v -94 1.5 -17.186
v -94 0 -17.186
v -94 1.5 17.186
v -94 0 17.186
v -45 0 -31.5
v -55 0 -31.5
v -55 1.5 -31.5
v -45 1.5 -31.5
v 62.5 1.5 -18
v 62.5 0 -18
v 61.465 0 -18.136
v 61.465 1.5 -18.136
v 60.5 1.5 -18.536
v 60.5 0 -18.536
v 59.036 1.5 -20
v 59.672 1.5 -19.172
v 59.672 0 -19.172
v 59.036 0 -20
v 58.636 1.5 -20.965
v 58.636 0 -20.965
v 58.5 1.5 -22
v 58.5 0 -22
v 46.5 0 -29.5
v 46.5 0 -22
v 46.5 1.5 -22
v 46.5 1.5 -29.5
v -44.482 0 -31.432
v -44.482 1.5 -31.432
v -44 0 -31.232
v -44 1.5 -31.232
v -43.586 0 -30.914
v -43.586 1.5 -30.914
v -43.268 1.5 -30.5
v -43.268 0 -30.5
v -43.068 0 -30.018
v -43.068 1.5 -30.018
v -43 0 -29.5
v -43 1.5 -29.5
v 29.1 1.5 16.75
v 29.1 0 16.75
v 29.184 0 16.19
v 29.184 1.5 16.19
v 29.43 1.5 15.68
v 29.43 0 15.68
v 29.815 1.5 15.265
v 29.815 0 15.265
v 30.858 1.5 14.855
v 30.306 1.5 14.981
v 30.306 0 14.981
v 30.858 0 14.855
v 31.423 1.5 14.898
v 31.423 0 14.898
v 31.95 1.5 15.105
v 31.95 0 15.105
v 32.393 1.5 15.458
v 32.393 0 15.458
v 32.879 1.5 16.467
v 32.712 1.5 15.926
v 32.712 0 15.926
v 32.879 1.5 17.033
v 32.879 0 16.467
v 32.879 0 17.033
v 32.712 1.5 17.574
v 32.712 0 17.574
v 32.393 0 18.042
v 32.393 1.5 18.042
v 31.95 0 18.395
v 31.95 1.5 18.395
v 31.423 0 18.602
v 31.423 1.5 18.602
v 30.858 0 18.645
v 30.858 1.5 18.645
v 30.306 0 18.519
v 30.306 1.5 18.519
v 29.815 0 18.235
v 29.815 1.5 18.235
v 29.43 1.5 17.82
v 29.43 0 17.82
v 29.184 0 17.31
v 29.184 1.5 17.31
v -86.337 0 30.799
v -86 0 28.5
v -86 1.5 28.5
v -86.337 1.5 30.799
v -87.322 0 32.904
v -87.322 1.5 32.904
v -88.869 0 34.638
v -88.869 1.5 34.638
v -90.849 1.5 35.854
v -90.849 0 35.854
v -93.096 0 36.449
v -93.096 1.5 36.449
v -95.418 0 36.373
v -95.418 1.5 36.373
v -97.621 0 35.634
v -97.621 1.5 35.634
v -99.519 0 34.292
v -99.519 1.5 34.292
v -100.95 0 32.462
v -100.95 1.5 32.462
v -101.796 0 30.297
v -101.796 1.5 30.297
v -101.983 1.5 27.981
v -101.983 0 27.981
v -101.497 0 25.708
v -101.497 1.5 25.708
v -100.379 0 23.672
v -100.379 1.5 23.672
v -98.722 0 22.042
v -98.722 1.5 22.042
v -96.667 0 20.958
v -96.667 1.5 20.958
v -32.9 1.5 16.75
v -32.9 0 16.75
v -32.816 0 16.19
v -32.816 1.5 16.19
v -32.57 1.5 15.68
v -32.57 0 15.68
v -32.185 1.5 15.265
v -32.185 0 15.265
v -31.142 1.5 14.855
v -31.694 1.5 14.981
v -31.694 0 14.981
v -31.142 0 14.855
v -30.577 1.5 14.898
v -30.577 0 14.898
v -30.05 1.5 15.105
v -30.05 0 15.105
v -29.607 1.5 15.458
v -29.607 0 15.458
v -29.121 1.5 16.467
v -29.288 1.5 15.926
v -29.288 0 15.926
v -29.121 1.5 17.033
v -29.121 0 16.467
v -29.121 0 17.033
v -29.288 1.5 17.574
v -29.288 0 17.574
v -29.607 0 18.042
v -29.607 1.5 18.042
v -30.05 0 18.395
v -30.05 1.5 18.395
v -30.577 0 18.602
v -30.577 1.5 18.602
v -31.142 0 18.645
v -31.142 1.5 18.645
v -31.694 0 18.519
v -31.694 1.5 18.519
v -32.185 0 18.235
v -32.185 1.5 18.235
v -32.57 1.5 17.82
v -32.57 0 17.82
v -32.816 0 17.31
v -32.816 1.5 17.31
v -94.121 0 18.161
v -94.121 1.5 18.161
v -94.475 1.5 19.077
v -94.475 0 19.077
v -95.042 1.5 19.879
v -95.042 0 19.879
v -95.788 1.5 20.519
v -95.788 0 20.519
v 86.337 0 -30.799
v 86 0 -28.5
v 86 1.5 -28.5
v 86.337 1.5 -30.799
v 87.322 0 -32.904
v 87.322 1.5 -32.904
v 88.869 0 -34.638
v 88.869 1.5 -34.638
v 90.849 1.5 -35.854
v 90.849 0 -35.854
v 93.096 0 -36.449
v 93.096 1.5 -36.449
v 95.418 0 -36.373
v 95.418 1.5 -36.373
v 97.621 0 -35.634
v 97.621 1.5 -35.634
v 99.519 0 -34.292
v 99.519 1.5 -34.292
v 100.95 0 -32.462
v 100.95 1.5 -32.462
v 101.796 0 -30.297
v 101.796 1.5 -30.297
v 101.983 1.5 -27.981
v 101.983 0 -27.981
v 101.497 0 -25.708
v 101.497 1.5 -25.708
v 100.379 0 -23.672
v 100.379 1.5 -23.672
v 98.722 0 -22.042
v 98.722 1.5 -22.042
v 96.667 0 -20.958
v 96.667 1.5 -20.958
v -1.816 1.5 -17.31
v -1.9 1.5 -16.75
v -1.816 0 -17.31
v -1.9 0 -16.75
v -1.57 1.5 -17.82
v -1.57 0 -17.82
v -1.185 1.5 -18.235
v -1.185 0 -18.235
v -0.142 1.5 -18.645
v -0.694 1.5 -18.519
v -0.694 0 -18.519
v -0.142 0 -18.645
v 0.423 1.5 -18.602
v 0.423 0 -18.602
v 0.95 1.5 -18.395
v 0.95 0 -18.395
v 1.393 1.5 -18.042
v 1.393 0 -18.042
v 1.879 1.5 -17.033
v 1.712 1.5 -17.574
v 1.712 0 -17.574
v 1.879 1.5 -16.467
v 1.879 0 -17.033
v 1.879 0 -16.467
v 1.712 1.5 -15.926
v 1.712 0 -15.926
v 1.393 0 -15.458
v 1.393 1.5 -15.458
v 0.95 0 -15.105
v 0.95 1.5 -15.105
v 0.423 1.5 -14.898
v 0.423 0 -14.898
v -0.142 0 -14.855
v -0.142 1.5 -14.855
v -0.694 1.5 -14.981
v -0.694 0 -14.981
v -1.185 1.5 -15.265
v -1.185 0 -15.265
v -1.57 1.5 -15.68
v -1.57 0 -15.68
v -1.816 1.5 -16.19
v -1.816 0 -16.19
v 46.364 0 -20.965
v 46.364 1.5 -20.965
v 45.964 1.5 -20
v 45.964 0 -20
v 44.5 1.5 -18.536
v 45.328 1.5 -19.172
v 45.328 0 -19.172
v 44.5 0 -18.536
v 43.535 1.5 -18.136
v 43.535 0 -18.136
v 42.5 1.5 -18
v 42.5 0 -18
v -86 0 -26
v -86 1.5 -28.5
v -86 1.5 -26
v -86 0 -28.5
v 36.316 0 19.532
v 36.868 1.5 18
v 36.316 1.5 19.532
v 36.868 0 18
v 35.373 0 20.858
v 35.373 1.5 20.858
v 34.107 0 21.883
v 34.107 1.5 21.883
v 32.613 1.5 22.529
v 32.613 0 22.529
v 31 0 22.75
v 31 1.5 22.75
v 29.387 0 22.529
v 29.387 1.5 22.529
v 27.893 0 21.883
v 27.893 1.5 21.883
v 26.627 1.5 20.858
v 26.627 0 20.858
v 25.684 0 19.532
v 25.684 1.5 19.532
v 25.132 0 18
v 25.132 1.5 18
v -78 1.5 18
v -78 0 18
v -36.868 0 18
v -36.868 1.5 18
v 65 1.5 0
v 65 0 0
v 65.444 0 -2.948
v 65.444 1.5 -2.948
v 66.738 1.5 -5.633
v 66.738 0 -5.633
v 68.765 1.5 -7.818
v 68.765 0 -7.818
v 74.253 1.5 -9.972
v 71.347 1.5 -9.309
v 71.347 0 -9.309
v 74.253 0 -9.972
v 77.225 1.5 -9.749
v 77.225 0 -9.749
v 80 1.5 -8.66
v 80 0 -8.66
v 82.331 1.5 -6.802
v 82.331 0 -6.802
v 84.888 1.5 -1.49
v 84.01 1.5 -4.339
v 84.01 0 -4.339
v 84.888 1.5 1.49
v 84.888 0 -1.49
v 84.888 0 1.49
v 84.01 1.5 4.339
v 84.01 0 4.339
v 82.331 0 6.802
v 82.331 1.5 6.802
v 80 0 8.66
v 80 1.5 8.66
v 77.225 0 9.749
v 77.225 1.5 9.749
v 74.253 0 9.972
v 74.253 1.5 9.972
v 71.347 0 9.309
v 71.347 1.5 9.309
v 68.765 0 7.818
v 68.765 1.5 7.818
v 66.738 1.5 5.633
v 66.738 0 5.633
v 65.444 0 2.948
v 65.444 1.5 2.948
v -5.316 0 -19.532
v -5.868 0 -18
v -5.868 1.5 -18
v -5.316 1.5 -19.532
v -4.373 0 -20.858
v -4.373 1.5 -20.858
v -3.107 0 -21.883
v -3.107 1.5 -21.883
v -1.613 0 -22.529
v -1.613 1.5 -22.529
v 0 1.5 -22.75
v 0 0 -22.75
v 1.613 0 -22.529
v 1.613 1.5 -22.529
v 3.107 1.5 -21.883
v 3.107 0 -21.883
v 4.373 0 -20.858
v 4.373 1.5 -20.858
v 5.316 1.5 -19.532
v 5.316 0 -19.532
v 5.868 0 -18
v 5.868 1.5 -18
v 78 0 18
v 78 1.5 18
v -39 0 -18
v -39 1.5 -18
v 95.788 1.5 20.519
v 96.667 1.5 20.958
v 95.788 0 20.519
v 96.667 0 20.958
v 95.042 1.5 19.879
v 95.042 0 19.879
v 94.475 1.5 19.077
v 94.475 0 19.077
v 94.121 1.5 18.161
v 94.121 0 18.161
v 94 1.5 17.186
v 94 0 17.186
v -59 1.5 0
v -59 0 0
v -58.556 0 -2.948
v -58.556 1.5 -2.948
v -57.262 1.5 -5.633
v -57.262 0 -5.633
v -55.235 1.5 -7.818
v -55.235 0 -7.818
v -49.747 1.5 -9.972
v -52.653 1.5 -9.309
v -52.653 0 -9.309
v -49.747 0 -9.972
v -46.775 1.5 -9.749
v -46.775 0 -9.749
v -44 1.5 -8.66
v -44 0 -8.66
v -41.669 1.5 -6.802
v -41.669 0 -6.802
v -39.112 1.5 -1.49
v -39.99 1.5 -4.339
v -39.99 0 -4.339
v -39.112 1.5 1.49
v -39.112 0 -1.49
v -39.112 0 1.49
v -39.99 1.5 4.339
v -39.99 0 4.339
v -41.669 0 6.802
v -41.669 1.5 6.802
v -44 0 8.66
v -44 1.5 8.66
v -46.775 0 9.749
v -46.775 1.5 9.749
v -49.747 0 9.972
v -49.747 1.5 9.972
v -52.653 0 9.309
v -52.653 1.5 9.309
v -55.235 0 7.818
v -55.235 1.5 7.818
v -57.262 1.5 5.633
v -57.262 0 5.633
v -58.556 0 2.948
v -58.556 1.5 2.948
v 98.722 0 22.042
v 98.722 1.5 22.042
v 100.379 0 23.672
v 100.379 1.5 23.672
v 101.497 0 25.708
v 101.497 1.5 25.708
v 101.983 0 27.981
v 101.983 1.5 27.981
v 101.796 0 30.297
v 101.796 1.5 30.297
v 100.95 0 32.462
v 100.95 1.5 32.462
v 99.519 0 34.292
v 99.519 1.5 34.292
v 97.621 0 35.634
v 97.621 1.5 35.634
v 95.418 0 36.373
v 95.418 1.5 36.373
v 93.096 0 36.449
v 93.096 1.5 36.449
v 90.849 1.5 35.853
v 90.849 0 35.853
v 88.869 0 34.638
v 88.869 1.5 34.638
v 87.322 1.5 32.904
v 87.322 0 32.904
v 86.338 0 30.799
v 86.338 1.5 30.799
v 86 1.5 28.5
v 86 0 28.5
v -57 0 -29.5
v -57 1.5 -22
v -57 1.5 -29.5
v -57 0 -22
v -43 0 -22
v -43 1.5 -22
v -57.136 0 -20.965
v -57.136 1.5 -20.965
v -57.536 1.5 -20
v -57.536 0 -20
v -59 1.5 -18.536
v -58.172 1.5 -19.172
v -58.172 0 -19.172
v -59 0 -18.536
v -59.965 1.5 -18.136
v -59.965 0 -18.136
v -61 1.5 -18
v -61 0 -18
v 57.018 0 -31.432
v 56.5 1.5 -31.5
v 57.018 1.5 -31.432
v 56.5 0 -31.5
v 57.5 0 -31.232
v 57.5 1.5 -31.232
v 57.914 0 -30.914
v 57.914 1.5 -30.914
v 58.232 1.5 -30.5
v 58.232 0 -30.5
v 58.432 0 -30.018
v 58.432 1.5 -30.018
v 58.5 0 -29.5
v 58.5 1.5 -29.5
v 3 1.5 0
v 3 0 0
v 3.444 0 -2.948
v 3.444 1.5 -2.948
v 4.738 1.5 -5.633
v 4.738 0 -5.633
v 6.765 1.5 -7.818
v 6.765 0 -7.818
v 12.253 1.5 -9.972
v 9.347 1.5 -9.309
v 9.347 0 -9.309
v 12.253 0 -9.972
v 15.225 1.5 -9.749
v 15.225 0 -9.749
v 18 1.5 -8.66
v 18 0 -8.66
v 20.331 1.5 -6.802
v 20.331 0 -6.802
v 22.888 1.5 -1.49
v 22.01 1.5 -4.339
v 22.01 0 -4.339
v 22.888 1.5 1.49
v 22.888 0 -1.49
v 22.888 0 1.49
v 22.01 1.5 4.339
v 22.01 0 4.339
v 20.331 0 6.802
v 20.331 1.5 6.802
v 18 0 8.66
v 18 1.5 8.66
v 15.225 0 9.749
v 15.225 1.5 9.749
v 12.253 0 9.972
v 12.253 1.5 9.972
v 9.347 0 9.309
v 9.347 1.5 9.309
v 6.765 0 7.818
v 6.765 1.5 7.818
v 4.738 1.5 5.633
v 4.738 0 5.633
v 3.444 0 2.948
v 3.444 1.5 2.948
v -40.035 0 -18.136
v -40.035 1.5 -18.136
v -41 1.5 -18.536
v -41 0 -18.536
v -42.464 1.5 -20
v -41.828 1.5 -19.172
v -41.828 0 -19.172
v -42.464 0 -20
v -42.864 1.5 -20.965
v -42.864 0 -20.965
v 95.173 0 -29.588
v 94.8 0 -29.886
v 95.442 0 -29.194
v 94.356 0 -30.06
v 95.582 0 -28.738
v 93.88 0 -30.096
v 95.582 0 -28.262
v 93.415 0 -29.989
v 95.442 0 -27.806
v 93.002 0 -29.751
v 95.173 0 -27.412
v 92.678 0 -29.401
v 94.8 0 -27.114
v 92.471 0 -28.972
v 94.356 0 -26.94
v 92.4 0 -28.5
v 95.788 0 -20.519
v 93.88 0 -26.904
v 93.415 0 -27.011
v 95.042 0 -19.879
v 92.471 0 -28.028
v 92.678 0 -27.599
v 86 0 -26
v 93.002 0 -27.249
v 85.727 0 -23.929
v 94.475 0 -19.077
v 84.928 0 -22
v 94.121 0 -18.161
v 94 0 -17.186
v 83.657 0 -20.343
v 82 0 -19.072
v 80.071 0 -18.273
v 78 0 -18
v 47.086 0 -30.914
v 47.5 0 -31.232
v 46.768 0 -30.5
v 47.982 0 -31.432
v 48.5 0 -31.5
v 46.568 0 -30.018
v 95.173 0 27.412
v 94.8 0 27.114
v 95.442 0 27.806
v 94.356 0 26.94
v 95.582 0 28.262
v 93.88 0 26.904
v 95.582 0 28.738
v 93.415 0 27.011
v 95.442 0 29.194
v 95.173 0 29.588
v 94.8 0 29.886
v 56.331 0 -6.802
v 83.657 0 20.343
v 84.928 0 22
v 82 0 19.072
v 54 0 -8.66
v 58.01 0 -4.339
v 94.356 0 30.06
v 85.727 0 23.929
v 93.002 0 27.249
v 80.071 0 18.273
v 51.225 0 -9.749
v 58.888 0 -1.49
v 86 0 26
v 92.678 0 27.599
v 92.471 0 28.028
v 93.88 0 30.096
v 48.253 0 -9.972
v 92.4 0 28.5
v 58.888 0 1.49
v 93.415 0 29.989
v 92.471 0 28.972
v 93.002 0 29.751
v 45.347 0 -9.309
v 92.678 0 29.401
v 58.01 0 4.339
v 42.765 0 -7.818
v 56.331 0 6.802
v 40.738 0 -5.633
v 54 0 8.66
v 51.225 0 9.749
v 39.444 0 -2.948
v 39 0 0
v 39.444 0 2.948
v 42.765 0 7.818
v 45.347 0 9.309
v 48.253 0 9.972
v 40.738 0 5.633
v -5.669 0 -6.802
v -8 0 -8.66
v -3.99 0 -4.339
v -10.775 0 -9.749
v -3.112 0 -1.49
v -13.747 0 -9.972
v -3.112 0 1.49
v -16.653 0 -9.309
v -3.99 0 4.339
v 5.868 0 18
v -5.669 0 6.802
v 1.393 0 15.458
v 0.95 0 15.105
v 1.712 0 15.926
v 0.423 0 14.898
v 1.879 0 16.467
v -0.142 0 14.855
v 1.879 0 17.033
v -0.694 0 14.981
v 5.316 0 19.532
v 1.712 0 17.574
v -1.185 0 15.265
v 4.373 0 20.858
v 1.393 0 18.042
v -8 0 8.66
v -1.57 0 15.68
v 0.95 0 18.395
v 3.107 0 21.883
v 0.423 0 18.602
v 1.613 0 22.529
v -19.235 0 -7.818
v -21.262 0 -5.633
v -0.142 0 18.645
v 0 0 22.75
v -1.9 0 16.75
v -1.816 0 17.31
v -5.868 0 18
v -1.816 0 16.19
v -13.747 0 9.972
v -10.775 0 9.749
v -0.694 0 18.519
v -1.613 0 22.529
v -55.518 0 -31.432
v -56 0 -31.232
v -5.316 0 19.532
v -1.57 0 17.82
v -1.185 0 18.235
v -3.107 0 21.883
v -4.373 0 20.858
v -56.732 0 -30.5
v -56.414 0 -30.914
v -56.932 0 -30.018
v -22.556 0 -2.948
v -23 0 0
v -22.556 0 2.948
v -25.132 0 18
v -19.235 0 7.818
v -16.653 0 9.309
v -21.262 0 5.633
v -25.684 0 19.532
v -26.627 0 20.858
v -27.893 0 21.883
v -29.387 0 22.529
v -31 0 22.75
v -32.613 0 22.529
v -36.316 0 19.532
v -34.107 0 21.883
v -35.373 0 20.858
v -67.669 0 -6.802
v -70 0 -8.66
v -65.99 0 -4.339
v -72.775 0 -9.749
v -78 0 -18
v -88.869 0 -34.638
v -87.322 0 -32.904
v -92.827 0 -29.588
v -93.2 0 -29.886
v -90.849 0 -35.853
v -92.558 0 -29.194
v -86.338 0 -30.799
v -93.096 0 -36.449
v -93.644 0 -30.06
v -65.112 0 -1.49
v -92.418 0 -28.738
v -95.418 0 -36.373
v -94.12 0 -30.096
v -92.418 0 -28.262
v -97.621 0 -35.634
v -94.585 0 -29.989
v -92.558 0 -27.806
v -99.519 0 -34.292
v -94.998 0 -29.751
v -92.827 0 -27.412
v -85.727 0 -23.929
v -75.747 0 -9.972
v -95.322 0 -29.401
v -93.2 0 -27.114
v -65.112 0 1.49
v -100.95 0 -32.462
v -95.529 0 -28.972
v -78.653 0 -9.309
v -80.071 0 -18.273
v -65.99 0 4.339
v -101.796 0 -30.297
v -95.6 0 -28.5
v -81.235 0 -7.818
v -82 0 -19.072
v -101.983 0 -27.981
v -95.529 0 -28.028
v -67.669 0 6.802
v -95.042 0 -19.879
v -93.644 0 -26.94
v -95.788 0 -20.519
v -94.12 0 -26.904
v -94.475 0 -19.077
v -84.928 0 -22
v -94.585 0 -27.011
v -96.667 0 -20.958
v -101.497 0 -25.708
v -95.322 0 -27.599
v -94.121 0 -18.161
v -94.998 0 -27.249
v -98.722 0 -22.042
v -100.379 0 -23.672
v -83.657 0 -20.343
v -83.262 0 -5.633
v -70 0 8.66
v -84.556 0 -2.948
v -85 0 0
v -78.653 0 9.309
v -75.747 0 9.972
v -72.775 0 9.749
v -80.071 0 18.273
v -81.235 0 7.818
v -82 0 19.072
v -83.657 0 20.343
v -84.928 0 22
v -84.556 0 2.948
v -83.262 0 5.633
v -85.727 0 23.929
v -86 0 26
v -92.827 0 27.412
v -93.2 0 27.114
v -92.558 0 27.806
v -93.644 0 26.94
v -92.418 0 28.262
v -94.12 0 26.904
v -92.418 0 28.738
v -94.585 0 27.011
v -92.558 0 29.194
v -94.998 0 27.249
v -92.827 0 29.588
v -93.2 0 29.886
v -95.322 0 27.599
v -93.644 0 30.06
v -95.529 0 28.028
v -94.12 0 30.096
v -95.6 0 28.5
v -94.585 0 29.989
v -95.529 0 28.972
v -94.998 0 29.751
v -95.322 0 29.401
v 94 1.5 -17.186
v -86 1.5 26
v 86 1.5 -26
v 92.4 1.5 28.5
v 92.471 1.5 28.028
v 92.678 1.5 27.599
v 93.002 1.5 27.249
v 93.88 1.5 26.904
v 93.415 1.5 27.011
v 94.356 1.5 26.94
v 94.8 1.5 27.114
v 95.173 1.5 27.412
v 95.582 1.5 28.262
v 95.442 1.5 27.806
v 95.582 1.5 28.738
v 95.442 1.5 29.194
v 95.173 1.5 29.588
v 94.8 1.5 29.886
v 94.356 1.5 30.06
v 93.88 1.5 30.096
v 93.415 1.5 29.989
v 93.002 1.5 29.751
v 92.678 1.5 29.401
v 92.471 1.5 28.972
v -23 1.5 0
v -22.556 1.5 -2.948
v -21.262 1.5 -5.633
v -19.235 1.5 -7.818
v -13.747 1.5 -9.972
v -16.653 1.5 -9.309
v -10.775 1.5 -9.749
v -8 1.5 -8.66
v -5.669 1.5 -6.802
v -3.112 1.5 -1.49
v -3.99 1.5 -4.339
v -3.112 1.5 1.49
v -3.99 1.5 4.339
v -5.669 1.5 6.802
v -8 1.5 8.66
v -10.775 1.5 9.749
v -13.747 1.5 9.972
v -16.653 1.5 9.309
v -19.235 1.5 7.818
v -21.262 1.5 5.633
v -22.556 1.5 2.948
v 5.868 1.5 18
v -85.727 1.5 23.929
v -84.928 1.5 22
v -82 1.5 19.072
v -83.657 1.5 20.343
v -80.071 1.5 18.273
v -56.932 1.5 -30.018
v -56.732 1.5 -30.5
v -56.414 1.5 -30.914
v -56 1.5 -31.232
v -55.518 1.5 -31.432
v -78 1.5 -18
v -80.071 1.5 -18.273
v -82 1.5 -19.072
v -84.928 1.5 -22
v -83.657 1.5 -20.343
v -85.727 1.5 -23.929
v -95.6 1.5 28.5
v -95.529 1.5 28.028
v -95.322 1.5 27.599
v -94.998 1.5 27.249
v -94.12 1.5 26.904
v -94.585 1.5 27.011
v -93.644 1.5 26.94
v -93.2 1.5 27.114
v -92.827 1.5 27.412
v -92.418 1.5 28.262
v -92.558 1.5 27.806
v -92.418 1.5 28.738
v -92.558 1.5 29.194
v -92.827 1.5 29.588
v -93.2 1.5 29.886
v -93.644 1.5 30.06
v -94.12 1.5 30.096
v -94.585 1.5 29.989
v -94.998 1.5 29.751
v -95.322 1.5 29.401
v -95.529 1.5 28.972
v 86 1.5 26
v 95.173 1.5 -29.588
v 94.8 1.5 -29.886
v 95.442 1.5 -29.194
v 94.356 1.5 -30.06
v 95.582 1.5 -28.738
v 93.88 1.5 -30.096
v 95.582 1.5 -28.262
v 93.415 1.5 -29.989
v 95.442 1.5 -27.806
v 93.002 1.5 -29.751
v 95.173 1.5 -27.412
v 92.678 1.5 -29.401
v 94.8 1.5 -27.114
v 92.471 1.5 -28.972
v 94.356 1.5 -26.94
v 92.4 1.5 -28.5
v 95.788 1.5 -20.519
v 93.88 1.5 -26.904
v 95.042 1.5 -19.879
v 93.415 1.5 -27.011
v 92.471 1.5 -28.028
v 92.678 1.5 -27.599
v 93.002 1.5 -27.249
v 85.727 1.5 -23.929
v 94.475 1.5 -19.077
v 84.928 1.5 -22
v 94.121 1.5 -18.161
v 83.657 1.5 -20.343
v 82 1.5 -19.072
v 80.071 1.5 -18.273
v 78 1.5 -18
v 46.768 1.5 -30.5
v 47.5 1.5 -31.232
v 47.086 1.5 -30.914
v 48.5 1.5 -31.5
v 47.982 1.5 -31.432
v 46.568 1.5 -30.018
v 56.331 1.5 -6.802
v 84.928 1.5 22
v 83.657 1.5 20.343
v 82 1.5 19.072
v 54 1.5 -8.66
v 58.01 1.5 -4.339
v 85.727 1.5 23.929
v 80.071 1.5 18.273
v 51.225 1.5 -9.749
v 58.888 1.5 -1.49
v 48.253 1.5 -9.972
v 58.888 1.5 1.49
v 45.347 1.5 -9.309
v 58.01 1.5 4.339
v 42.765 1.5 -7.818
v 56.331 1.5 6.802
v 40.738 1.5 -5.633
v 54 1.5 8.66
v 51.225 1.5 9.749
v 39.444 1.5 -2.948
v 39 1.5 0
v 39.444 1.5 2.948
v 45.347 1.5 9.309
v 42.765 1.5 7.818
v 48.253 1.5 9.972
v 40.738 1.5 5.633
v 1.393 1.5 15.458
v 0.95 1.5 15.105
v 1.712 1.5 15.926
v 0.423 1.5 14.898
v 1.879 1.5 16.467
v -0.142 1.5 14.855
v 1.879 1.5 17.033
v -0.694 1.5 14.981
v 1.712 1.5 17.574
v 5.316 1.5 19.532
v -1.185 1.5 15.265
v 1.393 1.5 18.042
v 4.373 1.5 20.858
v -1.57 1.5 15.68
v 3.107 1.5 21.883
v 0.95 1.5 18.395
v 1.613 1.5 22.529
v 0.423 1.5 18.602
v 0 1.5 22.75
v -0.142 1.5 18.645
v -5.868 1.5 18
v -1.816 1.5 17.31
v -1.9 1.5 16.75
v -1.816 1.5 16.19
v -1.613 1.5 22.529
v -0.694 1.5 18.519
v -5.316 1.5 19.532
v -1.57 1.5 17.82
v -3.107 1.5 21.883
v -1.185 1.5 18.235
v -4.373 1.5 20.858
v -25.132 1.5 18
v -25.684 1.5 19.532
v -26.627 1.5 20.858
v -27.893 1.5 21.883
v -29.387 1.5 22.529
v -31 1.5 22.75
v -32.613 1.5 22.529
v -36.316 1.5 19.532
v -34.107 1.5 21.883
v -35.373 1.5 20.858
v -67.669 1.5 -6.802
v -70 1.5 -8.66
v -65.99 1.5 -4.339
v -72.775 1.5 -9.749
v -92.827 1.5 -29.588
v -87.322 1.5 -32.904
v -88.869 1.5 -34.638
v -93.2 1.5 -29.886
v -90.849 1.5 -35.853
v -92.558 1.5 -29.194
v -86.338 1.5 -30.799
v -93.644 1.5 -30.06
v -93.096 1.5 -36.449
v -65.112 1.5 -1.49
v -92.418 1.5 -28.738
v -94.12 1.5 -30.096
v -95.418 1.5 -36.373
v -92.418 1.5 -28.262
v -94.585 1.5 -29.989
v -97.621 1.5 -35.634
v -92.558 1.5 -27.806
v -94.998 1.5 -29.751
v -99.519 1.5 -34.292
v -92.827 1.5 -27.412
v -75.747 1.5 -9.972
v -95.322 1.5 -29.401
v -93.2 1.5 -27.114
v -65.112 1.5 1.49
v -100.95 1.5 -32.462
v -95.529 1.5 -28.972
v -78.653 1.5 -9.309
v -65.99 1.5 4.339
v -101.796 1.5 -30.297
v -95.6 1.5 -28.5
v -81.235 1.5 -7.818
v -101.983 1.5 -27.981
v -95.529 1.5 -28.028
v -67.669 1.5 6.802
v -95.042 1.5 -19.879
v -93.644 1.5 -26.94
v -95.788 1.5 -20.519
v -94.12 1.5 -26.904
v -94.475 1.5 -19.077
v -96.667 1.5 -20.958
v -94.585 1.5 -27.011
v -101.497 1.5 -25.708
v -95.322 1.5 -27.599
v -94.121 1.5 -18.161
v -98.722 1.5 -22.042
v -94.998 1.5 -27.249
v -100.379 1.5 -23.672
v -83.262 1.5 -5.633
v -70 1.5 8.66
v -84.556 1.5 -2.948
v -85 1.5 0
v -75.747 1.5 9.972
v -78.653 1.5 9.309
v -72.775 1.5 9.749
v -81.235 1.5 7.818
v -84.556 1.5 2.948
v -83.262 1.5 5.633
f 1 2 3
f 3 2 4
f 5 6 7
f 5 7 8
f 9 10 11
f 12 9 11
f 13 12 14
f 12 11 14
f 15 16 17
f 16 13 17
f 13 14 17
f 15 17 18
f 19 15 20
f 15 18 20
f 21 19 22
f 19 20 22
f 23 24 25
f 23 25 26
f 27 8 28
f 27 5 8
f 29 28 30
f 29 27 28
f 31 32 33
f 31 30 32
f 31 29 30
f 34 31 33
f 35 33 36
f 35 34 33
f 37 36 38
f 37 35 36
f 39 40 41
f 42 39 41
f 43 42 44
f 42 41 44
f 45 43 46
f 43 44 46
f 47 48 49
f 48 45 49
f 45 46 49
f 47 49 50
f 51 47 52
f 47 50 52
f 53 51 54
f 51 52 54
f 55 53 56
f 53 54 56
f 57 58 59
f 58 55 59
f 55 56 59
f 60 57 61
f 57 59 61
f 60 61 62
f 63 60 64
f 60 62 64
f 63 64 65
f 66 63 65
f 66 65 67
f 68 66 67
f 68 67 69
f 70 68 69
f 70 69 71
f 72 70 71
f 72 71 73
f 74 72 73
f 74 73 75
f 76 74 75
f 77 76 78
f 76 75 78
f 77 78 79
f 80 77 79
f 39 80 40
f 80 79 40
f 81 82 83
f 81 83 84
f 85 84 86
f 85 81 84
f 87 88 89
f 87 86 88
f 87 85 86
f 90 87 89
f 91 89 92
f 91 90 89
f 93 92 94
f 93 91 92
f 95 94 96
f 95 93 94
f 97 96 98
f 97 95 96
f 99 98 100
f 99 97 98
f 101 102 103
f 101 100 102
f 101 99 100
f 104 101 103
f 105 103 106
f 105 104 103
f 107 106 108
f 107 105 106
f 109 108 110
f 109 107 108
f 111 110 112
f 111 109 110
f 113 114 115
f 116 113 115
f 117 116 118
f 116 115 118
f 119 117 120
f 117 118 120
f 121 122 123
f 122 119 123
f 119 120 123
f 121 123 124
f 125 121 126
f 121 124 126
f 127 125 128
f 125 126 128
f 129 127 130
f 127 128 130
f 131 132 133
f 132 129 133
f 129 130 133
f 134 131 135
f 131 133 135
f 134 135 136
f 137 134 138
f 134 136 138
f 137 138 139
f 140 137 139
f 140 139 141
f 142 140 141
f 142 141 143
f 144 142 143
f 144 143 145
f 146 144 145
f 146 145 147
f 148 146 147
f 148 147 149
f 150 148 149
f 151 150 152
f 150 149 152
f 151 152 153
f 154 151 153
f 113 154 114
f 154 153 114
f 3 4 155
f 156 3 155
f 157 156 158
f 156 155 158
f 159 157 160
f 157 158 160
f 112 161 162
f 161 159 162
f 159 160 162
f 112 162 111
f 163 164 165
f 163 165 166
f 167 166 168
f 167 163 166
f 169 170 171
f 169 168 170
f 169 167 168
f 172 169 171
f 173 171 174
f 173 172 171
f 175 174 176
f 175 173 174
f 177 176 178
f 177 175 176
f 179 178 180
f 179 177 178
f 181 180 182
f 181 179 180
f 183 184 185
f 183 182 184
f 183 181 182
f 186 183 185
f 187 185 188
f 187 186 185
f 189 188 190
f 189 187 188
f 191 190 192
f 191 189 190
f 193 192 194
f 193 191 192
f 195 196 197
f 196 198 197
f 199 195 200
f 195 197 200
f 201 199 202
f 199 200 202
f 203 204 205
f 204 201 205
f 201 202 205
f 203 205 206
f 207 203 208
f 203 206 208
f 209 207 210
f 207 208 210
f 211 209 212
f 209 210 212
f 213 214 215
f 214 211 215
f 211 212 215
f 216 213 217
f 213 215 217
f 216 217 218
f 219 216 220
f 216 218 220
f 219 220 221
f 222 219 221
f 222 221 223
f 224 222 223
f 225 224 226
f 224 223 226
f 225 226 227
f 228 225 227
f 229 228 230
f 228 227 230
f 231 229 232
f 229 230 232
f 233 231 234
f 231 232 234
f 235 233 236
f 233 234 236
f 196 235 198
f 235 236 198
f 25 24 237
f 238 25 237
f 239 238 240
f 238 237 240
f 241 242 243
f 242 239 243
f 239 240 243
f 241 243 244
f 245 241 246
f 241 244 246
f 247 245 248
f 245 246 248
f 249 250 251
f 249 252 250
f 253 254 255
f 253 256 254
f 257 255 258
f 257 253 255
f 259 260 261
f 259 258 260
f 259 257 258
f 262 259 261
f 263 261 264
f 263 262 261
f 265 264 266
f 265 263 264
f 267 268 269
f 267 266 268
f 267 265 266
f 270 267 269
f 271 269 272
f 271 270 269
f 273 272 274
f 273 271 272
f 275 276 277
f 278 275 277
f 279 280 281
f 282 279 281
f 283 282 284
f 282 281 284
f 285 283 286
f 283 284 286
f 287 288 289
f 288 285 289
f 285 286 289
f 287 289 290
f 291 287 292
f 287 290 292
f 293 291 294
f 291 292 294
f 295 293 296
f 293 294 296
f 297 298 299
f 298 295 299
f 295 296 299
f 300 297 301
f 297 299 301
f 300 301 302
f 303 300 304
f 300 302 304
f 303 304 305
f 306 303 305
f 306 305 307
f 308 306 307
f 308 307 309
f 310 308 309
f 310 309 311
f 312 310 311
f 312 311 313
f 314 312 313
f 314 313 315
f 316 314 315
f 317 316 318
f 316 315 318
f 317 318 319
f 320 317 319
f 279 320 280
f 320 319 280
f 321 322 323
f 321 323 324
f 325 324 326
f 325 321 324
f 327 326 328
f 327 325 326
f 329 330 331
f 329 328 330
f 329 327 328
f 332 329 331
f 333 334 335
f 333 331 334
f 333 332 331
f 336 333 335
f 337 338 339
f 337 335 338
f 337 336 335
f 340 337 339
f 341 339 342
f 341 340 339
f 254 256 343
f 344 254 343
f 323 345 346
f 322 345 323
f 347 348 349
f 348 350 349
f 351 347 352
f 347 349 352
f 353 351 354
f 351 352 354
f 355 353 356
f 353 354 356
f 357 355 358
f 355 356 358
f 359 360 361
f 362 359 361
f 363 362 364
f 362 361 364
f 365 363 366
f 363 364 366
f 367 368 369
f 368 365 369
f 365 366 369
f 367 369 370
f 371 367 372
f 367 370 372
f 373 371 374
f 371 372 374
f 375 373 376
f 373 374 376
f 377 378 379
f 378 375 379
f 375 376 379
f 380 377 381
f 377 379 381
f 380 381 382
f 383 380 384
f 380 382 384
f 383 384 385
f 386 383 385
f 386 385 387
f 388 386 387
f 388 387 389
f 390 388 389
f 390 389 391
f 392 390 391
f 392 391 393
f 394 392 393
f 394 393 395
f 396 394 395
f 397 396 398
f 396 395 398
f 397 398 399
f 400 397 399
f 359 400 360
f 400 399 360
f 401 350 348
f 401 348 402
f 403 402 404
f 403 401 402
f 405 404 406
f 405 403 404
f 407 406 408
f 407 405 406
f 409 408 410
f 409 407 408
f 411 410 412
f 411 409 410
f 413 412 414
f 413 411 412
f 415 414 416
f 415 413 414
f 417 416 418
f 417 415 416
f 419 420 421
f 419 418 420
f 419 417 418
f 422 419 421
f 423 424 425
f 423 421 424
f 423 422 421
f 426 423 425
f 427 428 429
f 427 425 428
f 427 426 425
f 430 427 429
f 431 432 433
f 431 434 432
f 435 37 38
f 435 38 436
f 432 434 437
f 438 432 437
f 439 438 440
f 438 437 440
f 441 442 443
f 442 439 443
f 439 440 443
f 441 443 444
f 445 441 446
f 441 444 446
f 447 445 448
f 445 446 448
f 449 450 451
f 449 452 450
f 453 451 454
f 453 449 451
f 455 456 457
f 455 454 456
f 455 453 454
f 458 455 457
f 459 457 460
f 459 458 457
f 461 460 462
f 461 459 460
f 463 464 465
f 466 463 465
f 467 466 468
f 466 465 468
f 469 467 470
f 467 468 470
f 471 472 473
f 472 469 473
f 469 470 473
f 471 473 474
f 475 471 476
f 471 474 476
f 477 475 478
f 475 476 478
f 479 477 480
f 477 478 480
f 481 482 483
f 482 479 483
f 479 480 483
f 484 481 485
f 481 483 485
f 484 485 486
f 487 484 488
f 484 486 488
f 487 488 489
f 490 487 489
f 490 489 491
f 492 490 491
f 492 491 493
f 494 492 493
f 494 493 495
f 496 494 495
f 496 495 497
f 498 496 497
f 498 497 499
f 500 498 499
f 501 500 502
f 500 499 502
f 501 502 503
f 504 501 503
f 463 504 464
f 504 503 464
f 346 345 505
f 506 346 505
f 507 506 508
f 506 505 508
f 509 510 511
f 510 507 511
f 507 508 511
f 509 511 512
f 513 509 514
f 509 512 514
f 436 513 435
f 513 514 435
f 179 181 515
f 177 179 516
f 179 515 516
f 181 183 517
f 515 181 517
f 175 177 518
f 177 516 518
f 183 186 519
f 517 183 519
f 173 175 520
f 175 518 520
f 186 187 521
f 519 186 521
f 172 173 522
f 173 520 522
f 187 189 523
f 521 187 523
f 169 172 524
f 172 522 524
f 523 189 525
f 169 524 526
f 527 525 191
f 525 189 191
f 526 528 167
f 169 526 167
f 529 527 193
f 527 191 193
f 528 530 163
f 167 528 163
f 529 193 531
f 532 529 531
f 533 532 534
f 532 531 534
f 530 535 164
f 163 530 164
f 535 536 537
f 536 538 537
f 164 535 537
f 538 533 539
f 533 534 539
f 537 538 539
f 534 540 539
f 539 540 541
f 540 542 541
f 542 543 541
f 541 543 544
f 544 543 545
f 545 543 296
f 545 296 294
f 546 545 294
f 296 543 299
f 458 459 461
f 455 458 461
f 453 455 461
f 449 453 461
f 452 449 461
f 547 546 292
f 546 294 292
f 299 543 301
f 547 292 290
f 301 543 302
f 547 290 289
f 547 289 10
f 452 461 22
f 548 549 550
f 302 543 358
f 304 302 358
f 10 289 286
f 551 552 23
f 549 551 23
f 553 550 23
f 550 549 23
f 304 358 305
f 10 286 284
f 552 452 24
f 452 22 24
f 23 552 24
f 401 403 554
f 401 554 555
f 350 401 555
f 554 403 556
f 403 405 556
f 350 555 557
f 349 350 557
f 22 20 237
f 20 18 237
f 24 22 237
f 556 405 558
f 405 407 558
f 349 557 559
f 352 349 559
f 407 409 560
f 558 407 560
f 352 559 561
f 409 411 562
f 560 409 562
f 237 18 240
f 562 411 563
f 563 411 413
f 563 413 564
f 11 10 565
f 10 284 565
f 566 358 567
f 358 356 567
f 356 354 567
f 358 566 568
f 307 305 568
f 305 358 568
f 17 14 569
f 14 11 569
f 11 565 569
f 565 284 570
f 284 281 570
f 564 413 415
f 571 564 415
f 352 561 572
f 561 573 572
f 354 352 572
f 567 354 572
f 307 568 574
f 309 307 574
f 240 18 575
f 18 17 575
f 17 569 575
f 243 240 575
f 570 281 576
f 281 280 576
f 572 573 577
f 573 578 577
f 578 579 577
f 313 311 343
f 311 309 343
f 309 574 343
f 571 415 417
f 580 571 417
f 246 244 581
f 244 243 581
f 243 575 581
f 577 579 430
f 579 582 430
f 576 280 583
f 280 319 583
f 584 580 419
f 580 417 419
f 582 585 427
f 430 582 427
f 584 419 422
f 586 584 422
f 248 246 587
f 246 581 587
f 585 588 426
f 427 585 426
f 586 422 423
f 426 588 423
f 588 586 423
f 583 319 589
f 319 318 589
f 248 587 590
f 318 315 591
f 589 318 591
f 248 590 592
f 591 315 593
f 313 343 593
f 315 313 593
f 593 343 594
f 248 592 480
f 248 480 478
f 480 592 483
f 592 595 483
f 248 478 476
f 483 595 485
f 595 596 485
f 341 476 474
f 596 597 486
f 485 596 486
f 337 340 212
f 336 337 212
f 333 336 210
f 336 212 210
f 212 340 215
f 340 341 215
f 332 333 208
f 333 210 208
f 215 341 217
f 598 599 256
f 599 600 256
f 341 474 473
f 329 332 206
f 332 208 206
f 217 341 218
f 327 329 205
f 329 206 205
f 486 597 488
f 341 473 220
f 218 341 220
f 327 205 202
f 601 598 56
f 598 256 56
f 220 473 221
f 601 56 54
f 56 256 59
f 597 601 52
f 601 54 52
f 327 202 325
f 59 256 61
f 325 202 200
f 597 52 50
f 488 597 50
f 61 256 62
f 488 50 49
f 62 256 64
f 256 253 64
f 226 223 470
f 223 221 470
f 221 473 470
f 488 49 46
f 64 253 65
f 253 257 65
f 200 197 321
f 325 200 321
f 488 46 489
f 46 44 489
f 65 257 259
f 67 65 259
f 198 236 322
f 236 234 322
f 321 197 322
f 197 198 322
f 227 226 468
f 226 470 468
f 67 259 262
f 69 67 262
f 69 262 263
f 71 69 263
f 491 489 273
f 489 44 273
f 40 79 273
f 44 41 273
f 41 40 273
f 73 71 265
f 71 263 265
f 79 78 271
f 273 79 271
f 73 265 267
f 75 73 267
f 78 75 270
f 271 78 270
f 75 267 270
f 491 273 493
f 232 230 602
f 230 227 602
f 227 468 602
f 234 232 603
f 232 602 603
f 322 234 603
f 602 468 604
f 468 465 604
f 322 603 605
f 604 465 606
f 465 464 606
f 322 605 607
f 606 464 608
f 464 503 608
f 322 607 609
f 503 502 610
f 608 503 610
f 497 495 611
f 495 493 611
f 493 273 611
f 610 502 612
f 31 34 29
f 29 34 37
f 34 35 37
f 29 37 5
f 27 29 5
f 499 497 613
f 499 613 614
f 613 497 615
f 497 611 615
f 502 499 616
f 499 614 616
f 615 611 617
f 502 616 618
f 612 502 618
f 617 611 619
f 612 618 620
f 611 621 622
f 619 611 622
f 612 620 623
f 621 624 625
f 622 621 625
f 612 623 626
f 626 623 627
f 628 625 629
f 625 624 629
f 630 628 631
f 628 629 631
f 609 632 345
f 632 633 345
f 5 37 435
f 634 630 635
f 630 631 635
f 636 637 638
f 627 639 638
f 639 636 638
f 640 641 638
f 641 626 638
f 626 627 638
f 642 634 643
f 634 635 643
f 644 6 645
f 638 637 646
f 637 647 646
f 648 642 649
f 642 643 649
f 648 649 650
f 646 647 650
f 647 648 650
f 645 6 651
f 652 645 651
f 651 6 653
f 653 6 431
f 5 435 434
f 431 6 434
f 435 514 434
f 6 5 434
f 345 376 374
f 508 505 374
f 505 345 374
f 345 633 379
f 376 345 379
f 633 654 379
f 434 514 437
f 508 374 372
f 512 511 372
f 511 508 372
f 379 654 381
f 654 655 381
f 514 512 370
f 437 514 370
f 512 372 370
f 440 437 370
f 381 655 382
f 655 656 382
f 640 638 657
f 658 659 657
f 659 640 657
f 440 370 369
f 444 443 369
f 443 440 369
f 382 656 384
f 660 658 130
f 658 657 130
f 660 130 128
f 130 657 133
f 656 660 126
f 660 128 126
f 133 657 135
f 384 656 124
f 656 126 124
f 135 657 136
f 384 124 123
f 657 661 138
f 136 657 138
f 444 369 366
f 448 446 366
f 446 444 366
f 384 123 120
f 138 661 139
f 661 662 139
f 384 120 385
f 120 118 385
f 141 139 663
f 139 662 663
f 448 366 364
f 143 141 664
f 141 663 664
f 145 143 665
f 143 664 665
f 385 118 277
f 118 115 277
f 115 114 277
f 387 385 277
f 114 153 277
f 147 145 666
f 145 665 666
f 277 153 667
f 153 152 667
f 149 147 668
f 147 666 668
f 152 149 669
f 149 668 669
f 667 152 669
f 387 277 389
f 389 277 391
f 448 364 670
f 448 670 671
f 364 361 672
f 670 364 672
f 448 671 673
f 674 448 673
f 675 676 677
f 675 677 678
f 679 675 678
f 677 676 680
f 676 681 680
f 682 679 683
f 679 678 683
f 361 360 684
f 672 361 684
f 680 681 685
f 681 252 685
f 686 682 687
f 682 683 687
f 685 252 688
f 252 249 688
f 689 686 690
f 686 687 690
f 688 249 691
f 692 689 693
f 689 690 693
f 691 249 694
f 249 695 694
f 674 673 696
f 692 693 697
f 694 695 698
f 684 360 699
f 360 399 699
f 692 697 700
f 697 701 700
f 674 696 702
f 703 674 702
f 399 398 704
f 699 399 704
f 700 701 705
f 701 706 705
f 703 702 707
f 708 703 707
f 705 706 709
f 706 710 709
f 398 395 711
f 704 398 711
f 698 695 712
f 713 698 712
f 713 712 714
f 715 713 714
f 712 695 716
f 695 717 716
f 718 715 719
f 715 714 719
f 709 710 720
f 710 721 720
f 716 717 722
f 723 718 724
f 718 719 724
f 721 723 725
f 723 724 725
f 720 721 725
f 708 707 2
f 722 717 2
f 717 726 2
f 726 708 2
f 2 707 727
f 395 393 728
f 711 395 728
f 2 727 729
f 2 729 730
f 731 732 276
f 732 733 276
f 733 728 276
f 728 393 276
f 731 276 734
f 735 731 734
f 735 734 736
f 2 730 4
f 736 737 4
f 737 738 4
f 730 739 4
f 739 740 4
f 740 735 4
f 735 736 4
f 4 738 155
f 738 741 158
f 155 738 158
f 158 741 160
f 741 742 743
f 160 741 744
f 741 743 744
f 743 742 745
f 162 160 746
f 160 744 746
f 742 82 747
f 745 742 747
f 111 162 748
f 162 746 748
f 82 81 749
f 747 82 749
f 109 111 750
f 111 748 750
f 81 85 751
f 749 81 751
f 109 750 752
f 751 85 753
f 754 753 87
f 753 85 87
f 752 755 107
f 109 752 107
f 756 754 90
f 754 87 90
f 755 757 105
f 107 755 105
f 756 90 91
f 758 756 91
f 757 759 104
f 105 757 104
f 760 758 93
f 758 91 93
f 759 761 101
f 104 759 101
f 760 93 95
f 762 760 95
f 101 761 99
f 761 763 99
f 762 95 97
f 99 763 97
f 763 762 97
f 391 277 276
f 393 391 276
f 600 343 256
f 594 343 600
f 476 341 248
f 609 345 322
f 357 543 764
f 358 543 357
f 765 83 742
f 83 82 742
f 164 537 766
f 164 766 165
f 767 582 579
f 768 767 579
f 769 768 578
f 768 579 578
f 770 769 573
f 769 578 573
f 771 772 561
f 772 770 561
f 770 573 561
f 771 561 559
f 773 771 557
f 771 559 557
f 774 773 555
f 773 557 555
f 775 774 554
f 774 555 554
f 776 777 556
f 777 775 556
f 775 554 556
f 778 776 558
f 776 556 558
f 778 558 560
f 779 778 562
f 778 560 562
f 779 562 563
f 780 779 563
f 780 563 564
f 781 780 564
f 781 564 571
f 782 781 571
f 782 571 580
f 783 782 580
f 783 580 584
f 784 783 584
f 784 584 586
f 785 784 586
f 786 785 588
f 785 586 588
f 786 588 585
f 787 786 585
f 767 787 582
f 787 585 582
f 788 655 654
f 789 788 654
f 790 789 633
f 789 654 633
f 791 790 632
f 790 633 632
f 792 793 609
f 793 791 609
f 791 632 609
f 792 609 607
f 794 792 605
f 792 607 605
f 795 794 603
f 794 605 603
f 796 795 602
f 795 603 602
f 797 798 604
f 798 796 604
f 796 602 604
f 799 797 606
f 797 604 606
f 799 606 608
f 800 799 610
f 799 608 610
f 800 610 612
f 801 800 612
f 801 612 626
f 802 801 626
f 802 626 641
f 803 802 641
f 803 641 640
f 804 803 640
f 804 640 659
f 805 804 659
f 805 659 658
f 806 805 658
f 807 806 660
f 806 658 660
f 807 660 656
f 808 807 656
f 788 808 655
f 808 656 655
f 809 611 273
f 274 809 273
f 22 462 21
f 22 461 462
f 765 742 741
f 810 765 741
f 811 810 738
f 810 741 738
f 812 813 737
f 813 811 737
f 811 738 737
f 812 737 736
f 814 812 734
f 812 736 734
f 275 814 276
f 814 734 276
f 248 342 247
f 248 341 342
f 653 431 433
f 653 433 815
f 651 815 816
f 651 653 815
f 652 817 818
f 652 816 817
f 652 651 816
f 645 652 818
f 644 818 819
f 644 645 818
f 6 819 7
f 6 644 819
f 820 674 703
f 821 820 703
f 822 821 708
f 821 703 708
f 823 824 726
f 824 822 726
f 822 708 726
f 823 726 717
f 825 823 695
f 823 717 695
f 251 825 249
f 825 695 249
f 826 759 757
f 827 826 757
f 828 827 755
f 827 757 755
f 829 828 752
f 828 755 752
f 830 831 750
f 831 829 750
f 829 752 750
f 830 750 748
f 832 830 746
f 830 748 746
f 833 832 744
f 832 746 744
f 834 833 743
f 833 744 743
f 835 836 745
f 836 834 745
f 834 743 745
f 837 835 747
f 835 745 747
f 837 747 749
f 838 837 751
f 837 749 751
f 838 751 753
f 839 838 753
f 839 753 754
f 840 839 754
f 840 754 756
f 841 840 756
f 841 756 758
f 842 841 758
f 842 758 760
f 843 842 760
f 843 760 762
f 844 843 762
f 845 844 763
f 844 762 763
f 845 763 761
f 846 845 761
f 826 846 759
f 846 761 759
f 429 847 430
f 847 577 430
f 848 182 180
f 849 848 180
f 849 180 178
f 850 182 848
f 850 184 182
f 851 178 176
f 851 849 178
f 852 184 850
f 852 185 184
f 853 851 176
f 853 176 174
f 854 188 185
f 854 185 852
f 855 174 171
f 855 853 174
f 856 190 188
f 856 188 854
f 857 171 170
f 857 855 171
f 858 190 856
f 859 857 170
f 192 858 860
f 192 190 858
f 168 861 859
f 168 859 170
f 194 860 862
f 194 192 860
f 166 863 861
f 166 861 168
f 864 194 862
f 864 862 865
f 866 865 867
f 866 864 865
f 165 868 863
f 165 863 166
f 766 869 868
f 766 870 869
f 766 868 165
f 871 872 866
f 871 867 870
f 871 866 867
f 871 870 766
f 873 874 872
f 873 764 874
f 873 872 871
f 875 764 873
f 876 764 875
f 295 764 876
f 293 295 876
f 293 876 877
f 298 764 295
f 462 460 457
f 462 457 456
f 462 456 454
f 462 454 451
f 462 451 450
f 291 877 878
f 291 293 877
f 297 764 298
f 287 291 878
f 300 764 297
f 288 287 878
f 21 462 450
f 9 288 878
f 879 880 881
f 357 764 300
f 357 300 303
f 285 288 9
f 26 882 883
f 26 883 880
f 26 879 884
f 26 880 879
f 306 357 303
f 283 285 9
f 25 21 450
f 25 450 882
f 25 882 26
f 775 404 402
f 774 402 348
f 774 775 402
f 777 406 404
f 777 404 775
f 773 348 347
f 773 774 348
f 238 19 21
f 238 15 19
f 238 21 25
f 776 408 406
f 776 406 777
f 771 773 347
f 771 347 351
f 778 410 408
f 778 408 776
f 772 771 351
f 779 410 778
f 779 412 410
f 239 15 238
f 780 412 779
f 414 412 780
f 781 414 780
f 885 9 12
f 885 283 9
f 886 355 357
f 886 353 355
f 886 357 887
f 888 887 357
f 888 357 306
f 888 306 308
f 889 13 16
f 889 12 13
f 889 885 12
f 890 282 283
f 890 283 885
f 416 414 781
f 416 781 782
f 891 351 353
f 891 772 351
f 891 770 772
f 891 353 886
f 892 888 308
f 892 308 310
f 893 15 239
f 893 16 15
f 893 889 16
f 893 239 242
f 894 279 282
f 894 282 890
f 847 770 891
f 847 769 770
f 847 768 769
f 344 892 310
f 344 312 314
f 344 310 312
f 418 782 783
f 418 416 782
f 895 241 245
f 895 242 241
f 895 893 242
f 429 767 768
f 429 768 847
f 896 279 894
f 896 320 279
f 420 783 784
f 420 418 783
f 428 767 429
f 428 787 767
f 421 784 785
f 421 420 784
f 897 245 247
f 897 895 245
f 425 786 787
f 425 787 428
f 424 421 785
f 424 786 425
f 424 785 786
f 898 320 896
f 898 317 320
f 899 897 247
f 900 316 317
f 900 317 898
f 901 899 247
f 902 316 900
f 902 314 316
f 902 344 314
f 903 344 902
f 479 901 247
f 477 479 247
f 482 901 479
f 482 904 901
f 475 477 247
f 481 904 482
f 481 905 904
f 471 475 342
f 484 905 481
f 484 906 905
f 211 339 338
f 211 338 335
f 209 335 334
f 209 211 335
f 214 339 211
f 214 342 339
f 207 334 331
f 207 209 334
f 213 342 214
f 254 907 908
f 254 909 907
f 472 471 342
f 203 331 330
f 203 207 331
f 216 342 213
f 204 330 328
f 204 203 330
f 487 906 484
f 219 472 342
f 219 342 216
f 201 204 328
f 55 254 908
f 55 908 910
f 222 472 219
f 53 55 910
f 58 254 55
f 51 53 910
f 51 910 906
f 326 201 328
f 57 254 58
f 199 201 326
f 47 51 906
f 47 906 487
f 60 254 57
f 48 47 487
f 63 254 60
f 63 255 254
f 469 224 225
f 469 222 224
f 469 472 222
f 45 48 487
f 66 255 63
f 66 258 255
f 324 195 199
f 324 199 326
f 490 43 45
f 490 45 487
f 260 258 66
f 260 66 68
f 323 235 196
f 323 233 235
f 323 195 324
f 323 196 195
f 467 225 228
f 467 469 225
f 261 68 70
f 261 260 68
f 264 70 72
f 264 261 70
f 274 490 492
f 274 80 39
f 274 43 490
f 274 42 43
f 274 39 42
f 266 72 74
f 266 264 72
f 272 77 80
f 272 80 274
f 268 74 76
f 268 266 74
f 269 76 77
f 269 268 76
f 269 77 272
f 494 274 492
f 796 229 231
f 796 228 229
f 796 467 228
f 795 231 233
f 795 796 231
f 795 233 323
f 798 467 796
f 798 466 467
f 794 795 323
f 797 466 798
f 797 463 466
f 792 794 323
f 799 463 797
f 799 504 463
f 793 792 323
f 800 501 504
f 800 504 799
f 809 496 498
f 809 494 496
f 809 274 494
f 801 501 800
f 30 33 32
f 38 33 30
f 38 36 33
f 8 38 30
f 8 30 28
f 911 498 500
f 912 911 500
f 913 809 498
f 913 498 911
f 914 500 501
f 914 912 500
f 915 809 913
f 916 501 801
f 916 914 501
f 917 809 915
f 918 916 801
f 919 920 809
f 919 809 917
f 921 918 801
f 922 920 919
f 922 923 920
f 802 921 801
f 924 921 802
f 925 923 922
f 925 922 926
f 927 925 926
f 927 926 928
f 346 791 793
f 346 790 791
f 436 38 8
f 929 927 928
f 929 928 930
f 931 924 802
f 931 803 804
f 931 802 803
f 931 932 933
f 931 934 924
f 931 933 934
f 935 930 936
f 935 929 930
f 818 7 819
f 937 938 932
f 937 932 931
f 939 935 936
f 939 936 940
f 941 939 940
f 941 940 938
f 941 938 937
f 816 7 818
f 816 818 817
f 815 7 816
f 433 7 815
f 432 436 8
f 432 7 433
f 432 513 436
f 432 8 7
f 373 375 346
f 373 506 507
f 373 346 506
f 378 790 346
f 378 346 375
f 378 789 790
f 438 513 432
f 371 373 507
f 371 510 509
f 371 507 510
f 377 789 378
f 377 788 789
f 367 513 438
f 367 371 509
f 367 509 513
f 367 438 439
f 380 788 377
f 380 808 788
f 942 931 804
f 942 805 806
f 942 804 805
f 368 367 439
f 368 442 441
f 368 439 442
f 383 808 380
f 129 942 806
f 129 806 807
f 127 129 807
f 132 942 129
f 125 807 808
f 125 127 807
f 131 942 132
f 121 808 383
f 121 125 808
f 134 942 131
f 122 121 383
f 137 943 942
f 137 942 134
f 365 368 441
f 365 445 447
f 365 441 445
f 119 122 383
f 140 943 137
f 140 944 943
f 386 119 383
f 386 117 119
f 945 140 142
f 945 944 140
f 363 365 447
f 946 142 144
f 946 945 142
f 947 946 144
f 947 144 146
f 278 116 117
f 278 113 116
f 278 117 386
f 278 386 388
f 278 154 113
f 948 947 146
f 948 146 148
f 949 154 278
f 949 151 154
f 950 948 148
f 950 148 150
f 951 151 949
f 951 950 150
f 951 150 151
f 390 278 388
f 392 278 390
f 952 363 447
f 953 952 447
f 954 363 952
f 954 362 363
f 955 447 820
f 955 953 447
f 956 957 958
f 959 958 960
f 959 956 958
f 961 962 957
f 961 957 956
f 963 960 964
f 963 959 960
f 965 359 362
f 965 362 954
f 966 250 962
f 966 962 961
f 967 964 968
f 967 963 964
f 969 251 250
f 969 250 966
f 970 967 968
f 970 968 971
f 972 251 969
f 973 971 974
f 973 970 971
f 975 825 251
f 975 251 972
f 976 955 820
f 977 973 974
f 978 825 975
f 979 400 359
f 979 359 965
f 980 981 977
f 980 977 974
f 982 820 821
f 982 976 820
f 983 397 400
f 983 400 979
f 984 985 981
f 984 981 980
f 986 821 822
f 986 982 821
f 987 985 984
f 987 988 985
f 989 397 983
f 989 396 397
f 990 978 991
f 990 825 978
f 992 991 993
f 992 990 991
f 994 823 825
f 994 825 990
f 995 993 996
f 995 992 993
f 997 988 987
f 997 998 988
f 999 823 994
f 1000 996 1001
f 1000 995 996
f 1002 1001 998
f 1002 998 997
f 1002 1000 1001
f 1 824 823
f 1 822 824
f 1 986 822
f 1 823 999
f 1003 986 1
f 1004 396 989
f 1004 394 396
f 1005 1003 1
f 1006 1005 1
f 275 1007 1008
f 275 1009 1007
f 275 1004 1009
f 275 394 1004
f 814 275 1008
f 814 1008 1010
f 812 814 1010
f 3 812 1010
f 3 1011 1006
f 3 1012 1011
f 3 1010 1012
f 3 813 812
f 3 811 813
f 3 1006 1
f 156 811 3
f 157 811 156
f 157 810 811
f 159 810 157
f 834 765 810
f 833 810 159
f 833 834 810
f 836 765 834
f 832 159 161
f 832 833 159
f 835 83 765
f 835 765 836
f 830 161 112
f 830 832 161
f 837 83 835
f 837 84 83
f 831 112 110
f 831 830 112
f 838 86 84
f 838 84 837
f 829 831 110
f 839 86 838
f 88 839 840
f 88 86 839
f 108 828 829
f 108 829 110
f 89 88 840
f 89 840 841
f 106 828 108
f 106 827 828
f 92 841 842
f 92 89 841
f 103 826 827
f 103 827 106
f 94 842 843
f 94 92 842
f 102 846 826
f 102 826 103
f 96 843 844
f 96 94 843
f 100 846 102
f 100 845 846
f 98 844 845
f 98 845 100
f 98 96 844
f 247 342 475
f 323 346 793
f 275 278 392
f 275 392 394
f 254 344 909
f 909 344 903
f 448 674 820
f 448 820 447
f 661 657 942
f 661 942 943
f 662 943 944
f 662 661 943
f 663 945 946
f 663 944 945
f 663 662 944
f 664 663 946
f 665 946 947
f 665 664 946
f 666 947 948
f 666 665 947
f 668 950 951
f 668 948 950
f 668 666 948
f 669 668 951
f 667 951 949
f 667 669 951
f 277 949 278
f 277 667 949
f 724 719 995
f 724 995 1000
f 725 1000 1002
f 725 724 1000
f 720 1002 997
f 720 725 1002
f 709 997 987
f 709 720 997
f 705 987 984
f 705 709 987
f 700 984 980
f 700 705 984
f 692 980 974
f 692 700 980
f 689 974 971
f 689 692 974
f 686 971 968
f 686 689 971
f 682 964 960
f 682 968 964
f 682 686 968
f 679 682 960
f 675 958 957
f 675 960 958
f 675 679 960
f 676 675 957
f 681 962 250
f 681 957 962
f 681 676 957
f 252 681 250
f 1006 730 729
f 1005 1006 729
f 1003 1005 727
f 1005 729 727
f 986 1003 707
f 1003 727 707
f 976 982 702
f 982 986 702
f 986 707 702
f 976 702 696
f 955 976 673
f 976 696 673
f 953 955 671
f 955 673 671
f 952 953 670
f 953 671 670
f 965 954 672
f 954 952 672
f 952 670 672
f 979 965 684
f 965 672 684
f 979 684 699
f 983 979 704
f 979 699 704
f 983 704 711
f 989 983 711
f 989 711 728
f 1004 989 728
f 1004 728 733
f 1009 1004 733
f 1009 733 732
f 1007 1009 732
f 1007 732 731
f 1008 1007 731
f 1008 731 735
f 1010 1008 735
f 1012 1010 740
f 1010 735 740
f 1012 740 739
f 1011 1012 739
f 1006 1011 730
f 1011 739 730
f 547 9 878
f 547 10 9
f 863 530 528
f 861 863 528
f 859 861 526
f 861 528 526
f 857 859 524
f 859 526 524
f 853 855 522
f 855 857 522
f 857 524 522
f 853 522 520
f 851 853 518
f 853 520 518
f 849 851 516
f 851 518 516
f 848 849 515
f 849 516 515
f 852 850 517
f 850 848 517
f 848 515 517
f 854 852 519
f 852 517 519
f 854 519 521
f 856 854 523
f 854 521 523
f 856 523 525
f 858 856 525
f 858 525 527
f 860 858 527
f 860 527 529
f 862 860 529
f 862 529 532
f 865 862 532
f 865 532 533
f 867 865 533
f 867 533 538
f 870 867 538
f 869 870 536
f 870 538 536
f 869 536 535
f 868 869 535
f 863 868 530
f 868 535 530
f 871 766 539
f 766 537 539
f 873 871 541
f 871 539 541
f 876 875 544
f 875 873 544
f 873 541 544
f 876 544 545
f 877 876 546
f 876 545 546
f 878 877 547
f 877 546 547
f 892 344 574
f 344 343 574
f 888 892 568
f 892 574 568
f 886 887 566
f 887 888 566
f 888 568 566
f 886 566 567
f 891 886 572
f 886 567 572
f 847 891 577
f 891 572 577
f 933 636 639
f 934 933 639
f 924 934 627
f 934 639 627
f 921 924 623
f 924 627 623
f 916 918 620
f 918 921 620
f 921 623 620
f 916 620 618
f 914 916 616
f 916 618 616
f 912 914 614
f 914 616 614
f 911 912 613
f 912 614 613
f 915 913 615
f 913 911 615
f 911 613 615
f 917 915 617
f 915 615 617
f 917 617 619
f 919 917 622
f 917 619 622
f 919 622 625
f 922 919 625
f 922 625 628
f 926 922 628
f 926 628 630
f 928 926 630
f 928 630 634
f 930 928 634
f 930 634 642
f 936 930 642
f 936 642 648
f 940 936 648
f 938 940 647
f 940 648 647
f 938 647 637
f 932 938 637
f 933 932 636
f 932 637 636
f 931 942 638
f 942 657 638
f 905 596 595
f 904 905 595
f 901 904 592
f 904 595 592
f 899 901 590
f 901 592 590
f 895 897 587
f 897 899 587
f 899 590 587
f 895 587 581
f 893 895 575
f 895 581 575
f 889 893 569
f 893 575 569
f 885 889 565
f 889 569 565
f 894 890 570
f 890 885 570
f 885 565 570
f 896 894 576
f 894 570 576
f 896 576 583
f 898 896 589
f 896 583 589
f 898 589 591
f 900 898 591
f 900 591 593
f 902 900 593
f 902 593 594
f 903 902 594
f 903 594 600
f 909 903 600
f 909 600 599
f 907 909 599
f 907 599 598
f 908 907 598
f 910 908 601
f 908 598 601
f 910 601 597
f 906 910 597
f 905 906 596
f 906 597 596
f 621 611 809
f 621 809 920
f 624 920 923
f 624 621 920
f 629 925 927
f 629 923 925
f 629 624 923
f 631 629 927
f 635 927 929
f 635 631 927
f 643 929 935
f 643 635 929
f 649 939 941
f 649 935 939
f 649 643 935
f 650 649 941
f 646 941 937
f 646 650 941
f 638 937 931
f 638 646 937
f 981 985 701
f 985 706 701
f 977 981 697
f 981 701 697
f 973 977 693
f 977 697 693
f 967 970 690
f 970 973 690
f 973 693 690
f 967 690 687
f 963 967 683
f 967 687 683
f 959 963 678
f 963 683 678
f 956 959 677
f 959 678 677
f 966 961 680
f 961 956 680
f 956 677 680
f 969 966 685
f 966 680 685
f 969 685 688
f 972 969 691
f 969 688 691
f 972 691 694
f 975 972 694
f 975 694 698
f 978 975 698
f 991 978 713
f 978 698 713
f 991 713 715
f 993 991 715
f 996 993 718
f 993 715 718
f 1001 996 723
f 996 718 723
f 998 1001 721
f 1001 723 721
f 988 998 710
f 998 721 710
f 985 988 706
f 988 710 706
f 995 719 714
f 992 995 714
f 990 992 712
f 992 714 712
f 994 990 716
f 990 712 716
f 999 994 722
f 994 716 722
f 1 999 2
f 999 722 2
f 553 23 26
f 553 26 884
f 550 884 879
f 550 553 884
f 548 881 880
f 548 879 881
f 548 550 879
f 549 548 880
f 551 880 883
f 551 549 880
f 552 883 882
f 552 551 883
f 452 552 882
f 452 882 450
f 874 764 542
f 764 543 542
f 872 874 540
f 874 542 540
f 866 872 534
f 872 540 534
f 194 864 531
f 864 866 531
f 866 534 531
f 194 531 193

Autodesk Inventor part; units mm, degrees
ref_plane "YZ Plane" through (0, 0, 0) normal (1, 0, 0) x (0, 1, 0)
ref_plane "XZ Plane" through (0, 0, 0) normal (0, 1, 0) x (-1, 0, 0)
ref_plane "XY Plane" through (0, 0, 0) normal (0, 0, 1) x (1, 0, 0)
sketch "Sketch1" plane through (0, 0, 0) normal (0, 1, 0) x (-1, 0, 0)
  line L0 (-94, 28.5) -> (94, 28.5) construction
  line L1 (94, 28.5) -> (94, -28.5) construction
  line L2 (94, -28.5) -> (-94, -28.5) construction
  line L3 (-94, -28.5) -> (-94, 17.1863) construction
  line L4 (-94, 28.5) -> (94, -28.5) construction
  line L5 (94, 28.5) -> (-94, -28.5) construction
  arc A0 (86, -28.5) -> (96.6667, -20.9575) centre (94, -28.5) ccw
  arc A1 (96.6667, 20.9575) -> (86, 28.5) centre (94, 28.5) ccw
  arc A2 (-86, 28.5) -> (-96.6667, 20.9575) centre (-94, 28.5) ccw
  arc A3 (-96.6667, -20.9575) -> (-86, -28.5) centre (-94, -28.5) ccw
  line L6 (94, -17.1863) -> (94, 17.1863)
  line L7 (86, -28.5) -> (86, -26)
  line L8 (-86, -26) -> (-86, -28.5)
  line L9 (86, 28.5) -> (86, 26)
  line L10 (-86, 26) -> (-86, 28.5)
  circle A4 centre (13, 0) radius 10
  circle A5 centre (-13, 0) radius 10
  circle A6 centre (49, 0) radius 10
  circle A7 centre (75, 0) radius 10
  circle A8 centre (-49, 0) radius 10
  circle A9 centre (-75, 0) radius 10
  circle A10 centre (0, -16.75) radius 1.9
  circle A11 centre (0, 16.75) radius 1.9
  circle A12 centre (31, 16.75) radius 1.9
  circle A13 centre (-31, 16.75) radius 1.9
  arc A14 (-5.8683, -18) -> (5.8683, -18) centre (0, -16.75) ccw
  arc A15 (5.8683, 18) -> (-5.8683, 18) centre (0, 16.75) ccw
  arc A16 (36.8683, 18) -> (25.1317, 18) centre (31, 16.75) ccw
  arc A17 (-25.1317, 18) -> (-36.8683, 18) centre (-31, 16.75) ccw
  line L11 (78, -18) -> (61, -18)
  line L12 (-5.8683, -18) -> (-42.5, -18)
  line L13 (78, 18) -> (36.8683, 18)
  line L14 (25.1317, 18) -> (5.8683, 18)
  line L15 (-5.8683, 18) -> (-25.1317, 18)
  line L16 (-36.8683, 18) -> (-78, 18)
  arc A18 (86, -26) -> (78, -18) centre (78, -26) ccw
  arc A19 (78, 18) -> (86, 26) centre (78, 26) ccw
  arc A20 (-86, 26) -> (-78, 18) centre (-78, 26) ccw
  arc A21 (-78, -18) -> (-86, -26) centre (-78, -26) ccw
  arc A22 (94, -17.1863) -> (96.6667, -20.9575) centre (98, -17.1863) ccw
  arc A23 (96.6667, 20.9575) -> (94, 17.1863) centre (98, 17.1863) ccw
  arc A24 (-96.6667, -20.9575) -> (-94, -17.1863) centre (-98, -17.1863) ccw
  arc A25 (-94, 17.1863) -> (-96.6667, 20.9575) centre (-98, 17.1863) ccw
  circle A26 centre (94, -28.5) radius 1.6
  circle A27 centre (94, 28.5) radius 1.6
  circle A28 centre (-94, 28.5) radius 1.6
  circle A29 centre (-94, -28.5) radius 1.6
  line L17 (-94, -17.1863) -> (-94, 17.1863)
  line L18 (57, -22) -> (57, -29.5)
  line L19 (55, -31.5) -> (45, -31.5)
  line L20 (43, -29.5) -> (43, -22)
  line L21 (-46.5, -22) -> (-46.5, -29.5)
  line L22 (-48.5, -31.5) -> (-56.5, -31.5)
  line L23 (-58.5, -29.5) -> (-58.5, -22)
  line L24 (39, -18) -> (5.8683, -18)
  line L25 (-62.5, -18) -> (-78, -18)
  arc A30 (55, -31.5) -> (57, -29.5) centre (55, -29.5) ccw
  arc A31 (43, -29.5) -> (45, -31.5) centre (45, -29.5) ccw
  arc A32 (-48.5, -31.5) -> (-46.5, -29.5) centre (-48.5, -29.5) ccw
  arc A33 (-58.5, -29.5) -> (-56.5, -31.5) centre (-56.5, -29.5) ccw
  arc A34 (61, -18) -> (57, -22) centre (61, -22) ccw
  arc A35 (43, -22) -> (39, -18) centre (39, -22) ccw
  arc A36 (-42.5, -18) -> (-46.5, -22) centre (-42.5, -22) ccw
  arc A37 (-58.5, -22) -> (-62.5, -18) centre (-62.5, -22) ccw
  point P0 (0, 0)
  point P1 (94, 20.5)
  point P2 (-94, -20.5)
  point P3 (94, -20.5)
  point P4 (0, 0)
  point P5 (0, 0)
  point P6 (50, -31.5)
  point P7 (-52.5, -31.5)
  point P8 (57, -31.5)
  point P9 (43, -31.5)
  point P10 (43, -18)
  point P11 (-46.5, -31.5)
  point P12 (-58.5, -31.5)
  point P13 (-58.5, -18)
  point P14 (-52.5, -31.5)
  point P15 (50, -31.5)
  dimension "d0" = 188
  dimension "d1" = 57
  dimension "d2" = 20
  dimension "d3" = 26
  dimension "d4" = 13
  dimension "d5" = 36
  dimension "d6" = 26
  dimension "d7" = 36
  dimension "d8" = 26
  dimension "d9" = 8
  dimension "d10" = 16.75
  dimension "d11" = 3.8
  dimension "d12" = 16.75
  dimension "d13" = 31
  dimension "d14" = 31
  dimension "d15" = 12
  dimension "d16" = 18
  dimension "d17" = 18
  dimension "d18" = 8
  dimension "d19" = 4
  dimension "d20" = 3.2
  dimension "d23" = 50
  dimension "d24" = 52.5
  dimension "d25" = 31.5
  dimension "d26" = 14
  dimension "d27" = 12
  dimension "d28" = 2
  dimension "d29" = 4
extrude "Extrusion1" add sketch "Sketch1" along normal blind 1.5
equation "\"d6\" = d3"
equation "\"d7\" = d5"
equation "\"d8\" = d3"
properties part number "Cover"
